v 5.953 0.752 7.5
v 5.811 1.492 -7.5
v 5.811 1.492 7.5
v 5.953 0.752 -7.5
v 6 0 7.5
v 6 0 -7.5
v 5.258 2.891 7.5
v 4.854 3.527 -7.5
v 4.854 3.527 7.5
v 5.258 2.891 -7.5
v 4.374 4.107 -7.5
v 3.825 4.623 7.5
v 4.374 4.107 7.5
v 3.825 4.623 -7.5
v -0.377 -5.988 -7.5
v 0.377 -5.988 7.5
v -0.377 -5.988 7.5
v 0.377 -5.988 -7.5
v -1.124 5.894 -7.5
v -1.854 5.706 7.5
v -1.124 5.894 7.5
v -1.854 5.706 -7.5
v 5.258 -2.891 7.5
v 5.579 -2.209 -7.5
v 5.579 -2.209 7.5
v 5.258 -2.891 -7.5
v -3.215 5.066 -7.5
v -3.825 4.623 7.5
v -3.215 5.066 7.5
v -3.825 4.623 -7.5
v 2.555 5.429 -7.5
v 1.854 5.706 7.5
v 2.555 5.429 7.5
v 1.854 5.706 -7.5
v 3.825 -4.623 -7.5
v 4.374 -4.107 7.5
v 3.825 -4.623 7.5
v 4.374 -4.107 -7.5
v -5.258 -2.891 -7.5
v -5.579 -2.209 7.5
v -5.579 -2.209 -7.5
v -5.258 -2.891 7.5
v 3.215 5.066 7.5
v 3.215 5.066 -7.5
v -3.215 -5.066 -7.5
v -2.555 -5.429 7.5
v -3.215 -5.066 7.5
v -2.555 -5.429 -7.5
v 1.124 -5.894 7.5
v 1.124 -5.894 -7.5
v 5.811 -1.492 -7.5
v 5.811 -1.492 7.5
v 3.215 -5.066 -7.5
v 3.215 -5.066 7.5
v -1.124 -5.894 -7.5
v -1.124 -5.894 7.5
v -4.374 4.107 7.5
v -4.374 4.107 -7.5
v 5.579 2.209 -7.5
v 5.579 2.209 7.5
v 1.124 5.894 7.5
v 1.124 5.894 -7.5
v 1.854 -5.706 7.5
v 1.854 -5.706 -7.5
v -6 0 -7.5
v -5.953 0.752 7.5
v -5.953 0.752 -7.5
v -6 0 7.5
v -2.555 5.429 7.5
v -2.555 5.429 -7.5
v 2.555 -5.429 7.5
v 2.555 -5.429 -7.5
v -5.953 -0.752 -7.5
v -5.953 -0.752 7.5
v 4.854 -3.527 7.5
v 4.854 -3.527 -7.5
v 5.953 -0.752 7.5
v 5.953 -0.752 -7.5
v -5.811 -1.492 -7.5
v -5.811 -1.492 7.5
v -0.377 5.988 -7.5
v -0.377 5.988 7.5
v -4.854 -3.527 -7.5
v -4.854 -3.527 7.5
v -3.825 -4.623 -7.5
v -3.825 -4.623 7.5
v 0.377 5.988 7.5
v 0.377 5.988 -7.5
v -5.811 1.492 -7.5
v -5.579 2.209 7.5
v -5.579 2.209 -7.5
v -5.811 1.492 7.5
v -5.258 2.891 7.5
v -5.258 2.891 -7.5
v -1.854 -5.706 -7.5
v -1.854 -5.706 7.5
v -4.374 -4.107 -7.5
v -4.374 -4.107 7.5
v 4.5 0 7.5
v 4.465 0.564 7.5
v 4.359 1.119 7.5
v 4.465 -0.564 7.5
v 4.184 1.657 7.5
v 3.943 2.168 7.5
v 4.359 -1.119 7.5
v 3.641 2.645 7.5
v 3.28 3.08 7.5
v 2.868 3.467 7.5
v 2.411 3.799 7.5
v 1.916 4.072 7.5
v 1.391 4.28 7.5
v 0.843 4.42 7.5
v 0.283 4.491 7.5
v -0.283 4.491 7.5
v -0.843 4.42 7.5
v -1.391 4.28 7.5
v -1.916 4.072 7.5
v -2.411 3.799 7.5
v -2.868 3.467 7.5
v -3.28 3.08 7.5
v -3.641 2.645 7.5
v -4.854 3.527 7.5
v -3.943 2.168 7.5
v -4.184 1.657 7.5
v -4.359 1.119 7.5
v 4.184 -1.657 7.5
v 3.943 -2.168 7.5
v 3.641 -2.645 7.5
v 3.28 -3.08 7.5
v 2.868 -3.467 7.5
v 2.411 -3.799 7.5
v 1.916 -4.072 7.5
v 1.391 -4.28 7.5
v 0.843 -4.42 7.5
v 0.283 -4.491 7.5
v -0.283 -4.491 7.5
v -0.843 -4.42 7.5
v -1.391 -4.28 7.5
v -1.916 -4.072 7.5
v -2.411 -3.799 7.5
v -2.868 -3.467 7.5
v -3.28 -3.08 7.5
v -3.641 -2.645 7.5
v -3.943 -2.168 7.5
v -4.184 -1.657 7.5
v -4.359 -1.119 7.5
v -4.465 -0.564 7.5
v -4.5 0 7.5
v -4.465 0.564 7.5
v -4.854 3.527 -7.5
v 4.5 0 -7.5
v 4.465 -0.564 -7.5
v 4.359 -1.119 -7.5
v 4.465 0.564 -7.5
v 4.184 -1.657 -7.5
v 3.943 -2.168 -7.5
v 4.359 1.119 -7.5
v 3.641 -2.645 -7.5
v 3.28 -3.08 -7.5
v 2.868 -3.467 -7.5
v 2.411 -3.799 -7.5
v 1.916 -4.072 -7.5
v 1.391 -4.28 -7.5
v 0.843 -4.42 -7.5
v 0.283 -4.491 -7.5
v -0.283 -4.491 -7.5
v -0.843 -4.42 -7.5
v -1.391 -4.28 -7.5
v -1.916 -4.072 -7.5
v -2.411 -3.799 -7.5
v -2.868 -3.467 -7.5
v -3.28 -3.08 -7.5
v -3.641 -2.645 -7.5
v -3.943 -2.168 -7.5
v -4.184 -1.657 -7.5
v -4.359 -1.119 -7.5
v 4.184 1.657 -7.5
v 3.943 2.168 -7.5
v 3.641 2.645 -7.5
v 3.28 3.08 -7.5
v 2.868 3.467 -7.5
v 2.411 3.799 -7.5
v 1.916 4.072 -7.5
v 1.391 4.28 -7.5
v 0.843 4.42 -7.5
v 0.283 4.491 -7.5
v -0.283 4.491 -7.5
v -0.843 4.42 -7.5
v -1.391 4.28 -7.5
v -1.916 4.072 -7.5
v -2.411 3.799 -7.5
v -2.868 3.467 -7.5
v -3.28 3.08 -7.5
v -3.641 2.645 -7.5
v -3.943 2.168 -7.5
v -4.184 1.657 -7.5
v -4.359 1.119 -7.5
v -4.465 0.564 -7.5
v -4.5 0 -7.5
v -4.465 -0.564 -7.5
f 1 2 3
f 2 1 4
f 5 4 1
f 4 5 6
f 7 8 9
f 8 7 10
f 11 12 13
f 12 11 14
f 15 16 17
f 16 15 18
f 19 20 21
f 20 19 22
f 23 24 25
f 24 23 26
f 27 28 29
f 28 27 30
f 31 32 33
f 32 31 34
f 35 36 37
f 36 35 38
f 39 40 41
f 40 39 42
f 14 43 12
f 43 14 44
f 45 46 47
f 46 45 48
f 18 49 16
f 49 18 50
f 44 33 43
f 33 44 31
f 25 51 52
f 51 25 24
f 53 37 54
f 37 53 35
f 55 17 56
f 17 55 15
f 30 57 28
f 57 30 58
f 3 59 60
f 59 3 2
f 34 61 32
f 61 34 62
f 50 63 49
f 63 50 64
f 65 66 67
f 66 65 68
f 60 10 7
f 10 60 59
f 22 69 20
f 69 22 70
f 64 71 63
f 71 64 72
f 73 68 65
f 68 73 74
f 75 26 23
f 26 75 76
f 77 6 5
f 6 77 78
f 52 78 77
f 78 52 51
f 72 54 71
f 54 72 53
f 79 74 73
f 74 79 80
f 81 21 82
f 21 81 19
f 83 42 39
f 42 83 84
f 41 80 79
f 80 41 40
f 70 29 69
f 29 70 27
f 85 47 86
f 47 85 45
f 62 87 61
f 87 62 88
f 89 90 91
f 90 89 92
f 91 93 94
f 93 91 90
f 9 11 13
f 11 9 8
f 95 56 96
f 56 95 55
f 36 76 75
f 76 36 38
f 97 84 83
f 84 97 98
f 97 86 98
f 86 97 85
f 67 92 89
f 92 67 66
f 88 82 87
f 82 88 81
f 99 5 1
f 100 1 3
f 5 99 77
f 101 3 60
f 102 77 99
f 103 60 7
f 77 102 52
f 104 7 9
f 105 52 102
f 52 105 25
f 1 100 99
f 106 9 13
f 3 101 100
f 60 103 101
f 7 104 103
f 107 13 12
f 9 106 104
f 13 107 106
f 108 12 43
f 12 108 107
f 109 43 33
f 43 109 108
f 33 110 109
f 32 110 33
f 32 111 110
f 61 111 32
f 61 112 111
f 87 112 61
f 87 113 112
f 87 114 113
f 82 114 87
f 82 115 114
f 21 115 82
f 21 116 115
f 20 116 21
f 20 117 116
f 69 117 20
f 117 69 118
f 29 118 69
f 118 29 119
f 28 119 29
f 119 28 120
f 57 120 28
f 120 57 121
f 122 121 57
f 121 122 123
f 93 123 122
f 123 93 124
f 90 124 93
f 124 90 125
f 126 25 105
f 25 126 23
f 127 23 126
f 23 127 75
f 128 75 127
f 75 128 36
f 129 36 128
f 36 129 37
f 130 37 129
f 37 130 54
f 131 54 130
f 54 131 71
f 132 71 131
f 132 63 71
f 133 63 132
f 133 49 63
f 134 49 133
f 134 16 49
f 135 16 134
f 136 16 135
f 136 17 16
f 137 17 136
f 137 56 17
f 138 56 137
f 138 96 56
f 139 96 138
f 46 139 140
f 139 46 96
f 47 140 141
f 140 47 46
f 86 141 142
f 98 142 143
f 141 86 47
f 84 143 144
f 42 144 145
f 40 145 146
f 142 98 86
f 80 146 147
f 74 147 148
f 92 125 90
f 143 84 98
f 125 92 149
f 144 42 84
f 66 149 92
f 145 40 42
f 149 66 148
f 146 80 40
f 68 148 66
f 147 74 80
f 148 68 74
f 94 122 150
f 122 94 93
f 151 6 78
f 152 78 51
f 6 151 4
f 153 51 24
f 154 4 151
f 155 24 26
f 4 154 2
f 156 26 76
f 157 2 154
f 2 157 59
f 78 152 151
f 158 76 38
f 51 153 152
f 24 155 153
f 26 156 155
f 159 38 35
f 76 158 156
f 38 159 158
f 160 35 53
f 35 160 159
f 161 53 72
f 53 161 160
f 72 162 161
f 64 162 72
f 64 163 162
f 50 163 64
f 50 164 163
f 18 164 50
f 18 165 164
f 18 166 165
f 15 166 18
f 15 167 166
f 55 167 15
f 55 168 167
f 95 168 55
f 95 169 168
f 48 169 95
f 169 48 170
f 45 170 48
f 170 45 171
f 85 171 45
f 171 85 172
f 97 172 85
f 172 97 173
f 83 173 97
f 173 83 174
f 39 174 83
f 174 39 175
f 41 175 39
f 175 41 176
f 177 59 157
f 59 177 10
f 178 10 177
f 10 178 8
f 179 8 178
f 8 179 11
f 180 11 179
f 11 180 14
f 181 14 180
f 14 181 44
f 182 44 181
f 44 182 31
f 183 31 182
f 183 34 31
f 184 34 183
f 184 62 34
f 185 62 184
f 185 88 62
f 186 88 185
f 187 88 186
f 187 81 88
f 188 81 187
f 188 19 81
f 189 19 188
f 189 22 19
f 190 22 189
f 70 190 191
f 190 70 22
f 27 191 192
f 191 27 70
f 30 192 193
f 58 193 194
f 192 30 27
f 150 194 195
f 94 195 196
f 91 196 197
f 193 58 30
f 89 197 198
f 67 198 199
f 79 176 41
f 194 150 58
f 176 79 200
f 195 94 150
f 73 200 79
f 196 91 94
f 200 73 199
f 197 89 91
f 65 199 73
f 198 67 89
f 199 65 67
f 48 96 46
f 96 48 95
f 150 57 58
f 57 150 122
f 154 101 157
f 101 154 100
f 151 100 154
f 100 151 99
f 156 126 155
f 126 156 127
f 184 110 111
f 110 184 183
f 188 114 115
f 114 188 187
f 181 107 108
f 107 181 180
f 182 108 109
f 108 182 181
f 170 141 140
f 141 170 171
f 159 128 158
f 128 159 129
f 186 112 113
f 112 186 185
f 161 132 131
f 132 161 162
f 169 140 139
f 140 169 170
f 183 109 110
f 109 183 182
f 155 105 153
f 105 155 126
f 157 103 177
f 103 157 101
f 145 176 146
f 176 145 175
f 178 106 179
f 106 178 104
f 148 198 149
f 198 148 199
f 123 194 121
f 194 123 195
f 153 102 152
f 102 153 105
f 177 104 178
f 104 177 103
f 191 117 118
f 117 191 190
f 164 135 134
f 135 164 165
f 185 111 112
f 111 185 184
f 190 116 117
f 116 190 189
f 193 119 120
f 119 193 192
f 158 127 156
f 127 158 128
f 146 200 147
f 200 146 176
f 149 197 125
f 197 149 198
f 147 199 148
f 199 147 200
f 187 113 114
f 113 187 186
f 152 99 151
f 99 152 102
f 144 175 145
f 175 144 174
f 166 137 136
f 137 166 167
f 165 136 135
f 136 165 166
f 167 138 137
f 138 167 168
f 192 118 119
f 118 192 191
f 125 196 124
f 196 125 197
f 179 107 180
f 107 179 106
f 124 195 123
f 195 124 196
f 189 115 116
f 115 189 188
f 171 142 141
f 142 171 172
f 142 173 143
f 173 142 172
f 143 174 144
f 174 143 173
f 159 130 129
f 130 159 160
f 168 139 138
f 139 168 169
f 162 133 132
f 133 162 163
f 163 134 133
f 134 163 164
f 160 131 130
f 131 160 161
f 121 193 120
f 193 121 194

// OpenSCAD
$fn = 50;


difference() {
	union() {
		translate(v = [0, 0, -7.5000000000]) {
			cylinder(h = 15, r = 6.0000000000);
		}
	}
	union() {
		translate(v = [0, 0, -100.0000000000]) {
			cylinder(h = 200, r = 4.5000000000);
		}
	}
}
